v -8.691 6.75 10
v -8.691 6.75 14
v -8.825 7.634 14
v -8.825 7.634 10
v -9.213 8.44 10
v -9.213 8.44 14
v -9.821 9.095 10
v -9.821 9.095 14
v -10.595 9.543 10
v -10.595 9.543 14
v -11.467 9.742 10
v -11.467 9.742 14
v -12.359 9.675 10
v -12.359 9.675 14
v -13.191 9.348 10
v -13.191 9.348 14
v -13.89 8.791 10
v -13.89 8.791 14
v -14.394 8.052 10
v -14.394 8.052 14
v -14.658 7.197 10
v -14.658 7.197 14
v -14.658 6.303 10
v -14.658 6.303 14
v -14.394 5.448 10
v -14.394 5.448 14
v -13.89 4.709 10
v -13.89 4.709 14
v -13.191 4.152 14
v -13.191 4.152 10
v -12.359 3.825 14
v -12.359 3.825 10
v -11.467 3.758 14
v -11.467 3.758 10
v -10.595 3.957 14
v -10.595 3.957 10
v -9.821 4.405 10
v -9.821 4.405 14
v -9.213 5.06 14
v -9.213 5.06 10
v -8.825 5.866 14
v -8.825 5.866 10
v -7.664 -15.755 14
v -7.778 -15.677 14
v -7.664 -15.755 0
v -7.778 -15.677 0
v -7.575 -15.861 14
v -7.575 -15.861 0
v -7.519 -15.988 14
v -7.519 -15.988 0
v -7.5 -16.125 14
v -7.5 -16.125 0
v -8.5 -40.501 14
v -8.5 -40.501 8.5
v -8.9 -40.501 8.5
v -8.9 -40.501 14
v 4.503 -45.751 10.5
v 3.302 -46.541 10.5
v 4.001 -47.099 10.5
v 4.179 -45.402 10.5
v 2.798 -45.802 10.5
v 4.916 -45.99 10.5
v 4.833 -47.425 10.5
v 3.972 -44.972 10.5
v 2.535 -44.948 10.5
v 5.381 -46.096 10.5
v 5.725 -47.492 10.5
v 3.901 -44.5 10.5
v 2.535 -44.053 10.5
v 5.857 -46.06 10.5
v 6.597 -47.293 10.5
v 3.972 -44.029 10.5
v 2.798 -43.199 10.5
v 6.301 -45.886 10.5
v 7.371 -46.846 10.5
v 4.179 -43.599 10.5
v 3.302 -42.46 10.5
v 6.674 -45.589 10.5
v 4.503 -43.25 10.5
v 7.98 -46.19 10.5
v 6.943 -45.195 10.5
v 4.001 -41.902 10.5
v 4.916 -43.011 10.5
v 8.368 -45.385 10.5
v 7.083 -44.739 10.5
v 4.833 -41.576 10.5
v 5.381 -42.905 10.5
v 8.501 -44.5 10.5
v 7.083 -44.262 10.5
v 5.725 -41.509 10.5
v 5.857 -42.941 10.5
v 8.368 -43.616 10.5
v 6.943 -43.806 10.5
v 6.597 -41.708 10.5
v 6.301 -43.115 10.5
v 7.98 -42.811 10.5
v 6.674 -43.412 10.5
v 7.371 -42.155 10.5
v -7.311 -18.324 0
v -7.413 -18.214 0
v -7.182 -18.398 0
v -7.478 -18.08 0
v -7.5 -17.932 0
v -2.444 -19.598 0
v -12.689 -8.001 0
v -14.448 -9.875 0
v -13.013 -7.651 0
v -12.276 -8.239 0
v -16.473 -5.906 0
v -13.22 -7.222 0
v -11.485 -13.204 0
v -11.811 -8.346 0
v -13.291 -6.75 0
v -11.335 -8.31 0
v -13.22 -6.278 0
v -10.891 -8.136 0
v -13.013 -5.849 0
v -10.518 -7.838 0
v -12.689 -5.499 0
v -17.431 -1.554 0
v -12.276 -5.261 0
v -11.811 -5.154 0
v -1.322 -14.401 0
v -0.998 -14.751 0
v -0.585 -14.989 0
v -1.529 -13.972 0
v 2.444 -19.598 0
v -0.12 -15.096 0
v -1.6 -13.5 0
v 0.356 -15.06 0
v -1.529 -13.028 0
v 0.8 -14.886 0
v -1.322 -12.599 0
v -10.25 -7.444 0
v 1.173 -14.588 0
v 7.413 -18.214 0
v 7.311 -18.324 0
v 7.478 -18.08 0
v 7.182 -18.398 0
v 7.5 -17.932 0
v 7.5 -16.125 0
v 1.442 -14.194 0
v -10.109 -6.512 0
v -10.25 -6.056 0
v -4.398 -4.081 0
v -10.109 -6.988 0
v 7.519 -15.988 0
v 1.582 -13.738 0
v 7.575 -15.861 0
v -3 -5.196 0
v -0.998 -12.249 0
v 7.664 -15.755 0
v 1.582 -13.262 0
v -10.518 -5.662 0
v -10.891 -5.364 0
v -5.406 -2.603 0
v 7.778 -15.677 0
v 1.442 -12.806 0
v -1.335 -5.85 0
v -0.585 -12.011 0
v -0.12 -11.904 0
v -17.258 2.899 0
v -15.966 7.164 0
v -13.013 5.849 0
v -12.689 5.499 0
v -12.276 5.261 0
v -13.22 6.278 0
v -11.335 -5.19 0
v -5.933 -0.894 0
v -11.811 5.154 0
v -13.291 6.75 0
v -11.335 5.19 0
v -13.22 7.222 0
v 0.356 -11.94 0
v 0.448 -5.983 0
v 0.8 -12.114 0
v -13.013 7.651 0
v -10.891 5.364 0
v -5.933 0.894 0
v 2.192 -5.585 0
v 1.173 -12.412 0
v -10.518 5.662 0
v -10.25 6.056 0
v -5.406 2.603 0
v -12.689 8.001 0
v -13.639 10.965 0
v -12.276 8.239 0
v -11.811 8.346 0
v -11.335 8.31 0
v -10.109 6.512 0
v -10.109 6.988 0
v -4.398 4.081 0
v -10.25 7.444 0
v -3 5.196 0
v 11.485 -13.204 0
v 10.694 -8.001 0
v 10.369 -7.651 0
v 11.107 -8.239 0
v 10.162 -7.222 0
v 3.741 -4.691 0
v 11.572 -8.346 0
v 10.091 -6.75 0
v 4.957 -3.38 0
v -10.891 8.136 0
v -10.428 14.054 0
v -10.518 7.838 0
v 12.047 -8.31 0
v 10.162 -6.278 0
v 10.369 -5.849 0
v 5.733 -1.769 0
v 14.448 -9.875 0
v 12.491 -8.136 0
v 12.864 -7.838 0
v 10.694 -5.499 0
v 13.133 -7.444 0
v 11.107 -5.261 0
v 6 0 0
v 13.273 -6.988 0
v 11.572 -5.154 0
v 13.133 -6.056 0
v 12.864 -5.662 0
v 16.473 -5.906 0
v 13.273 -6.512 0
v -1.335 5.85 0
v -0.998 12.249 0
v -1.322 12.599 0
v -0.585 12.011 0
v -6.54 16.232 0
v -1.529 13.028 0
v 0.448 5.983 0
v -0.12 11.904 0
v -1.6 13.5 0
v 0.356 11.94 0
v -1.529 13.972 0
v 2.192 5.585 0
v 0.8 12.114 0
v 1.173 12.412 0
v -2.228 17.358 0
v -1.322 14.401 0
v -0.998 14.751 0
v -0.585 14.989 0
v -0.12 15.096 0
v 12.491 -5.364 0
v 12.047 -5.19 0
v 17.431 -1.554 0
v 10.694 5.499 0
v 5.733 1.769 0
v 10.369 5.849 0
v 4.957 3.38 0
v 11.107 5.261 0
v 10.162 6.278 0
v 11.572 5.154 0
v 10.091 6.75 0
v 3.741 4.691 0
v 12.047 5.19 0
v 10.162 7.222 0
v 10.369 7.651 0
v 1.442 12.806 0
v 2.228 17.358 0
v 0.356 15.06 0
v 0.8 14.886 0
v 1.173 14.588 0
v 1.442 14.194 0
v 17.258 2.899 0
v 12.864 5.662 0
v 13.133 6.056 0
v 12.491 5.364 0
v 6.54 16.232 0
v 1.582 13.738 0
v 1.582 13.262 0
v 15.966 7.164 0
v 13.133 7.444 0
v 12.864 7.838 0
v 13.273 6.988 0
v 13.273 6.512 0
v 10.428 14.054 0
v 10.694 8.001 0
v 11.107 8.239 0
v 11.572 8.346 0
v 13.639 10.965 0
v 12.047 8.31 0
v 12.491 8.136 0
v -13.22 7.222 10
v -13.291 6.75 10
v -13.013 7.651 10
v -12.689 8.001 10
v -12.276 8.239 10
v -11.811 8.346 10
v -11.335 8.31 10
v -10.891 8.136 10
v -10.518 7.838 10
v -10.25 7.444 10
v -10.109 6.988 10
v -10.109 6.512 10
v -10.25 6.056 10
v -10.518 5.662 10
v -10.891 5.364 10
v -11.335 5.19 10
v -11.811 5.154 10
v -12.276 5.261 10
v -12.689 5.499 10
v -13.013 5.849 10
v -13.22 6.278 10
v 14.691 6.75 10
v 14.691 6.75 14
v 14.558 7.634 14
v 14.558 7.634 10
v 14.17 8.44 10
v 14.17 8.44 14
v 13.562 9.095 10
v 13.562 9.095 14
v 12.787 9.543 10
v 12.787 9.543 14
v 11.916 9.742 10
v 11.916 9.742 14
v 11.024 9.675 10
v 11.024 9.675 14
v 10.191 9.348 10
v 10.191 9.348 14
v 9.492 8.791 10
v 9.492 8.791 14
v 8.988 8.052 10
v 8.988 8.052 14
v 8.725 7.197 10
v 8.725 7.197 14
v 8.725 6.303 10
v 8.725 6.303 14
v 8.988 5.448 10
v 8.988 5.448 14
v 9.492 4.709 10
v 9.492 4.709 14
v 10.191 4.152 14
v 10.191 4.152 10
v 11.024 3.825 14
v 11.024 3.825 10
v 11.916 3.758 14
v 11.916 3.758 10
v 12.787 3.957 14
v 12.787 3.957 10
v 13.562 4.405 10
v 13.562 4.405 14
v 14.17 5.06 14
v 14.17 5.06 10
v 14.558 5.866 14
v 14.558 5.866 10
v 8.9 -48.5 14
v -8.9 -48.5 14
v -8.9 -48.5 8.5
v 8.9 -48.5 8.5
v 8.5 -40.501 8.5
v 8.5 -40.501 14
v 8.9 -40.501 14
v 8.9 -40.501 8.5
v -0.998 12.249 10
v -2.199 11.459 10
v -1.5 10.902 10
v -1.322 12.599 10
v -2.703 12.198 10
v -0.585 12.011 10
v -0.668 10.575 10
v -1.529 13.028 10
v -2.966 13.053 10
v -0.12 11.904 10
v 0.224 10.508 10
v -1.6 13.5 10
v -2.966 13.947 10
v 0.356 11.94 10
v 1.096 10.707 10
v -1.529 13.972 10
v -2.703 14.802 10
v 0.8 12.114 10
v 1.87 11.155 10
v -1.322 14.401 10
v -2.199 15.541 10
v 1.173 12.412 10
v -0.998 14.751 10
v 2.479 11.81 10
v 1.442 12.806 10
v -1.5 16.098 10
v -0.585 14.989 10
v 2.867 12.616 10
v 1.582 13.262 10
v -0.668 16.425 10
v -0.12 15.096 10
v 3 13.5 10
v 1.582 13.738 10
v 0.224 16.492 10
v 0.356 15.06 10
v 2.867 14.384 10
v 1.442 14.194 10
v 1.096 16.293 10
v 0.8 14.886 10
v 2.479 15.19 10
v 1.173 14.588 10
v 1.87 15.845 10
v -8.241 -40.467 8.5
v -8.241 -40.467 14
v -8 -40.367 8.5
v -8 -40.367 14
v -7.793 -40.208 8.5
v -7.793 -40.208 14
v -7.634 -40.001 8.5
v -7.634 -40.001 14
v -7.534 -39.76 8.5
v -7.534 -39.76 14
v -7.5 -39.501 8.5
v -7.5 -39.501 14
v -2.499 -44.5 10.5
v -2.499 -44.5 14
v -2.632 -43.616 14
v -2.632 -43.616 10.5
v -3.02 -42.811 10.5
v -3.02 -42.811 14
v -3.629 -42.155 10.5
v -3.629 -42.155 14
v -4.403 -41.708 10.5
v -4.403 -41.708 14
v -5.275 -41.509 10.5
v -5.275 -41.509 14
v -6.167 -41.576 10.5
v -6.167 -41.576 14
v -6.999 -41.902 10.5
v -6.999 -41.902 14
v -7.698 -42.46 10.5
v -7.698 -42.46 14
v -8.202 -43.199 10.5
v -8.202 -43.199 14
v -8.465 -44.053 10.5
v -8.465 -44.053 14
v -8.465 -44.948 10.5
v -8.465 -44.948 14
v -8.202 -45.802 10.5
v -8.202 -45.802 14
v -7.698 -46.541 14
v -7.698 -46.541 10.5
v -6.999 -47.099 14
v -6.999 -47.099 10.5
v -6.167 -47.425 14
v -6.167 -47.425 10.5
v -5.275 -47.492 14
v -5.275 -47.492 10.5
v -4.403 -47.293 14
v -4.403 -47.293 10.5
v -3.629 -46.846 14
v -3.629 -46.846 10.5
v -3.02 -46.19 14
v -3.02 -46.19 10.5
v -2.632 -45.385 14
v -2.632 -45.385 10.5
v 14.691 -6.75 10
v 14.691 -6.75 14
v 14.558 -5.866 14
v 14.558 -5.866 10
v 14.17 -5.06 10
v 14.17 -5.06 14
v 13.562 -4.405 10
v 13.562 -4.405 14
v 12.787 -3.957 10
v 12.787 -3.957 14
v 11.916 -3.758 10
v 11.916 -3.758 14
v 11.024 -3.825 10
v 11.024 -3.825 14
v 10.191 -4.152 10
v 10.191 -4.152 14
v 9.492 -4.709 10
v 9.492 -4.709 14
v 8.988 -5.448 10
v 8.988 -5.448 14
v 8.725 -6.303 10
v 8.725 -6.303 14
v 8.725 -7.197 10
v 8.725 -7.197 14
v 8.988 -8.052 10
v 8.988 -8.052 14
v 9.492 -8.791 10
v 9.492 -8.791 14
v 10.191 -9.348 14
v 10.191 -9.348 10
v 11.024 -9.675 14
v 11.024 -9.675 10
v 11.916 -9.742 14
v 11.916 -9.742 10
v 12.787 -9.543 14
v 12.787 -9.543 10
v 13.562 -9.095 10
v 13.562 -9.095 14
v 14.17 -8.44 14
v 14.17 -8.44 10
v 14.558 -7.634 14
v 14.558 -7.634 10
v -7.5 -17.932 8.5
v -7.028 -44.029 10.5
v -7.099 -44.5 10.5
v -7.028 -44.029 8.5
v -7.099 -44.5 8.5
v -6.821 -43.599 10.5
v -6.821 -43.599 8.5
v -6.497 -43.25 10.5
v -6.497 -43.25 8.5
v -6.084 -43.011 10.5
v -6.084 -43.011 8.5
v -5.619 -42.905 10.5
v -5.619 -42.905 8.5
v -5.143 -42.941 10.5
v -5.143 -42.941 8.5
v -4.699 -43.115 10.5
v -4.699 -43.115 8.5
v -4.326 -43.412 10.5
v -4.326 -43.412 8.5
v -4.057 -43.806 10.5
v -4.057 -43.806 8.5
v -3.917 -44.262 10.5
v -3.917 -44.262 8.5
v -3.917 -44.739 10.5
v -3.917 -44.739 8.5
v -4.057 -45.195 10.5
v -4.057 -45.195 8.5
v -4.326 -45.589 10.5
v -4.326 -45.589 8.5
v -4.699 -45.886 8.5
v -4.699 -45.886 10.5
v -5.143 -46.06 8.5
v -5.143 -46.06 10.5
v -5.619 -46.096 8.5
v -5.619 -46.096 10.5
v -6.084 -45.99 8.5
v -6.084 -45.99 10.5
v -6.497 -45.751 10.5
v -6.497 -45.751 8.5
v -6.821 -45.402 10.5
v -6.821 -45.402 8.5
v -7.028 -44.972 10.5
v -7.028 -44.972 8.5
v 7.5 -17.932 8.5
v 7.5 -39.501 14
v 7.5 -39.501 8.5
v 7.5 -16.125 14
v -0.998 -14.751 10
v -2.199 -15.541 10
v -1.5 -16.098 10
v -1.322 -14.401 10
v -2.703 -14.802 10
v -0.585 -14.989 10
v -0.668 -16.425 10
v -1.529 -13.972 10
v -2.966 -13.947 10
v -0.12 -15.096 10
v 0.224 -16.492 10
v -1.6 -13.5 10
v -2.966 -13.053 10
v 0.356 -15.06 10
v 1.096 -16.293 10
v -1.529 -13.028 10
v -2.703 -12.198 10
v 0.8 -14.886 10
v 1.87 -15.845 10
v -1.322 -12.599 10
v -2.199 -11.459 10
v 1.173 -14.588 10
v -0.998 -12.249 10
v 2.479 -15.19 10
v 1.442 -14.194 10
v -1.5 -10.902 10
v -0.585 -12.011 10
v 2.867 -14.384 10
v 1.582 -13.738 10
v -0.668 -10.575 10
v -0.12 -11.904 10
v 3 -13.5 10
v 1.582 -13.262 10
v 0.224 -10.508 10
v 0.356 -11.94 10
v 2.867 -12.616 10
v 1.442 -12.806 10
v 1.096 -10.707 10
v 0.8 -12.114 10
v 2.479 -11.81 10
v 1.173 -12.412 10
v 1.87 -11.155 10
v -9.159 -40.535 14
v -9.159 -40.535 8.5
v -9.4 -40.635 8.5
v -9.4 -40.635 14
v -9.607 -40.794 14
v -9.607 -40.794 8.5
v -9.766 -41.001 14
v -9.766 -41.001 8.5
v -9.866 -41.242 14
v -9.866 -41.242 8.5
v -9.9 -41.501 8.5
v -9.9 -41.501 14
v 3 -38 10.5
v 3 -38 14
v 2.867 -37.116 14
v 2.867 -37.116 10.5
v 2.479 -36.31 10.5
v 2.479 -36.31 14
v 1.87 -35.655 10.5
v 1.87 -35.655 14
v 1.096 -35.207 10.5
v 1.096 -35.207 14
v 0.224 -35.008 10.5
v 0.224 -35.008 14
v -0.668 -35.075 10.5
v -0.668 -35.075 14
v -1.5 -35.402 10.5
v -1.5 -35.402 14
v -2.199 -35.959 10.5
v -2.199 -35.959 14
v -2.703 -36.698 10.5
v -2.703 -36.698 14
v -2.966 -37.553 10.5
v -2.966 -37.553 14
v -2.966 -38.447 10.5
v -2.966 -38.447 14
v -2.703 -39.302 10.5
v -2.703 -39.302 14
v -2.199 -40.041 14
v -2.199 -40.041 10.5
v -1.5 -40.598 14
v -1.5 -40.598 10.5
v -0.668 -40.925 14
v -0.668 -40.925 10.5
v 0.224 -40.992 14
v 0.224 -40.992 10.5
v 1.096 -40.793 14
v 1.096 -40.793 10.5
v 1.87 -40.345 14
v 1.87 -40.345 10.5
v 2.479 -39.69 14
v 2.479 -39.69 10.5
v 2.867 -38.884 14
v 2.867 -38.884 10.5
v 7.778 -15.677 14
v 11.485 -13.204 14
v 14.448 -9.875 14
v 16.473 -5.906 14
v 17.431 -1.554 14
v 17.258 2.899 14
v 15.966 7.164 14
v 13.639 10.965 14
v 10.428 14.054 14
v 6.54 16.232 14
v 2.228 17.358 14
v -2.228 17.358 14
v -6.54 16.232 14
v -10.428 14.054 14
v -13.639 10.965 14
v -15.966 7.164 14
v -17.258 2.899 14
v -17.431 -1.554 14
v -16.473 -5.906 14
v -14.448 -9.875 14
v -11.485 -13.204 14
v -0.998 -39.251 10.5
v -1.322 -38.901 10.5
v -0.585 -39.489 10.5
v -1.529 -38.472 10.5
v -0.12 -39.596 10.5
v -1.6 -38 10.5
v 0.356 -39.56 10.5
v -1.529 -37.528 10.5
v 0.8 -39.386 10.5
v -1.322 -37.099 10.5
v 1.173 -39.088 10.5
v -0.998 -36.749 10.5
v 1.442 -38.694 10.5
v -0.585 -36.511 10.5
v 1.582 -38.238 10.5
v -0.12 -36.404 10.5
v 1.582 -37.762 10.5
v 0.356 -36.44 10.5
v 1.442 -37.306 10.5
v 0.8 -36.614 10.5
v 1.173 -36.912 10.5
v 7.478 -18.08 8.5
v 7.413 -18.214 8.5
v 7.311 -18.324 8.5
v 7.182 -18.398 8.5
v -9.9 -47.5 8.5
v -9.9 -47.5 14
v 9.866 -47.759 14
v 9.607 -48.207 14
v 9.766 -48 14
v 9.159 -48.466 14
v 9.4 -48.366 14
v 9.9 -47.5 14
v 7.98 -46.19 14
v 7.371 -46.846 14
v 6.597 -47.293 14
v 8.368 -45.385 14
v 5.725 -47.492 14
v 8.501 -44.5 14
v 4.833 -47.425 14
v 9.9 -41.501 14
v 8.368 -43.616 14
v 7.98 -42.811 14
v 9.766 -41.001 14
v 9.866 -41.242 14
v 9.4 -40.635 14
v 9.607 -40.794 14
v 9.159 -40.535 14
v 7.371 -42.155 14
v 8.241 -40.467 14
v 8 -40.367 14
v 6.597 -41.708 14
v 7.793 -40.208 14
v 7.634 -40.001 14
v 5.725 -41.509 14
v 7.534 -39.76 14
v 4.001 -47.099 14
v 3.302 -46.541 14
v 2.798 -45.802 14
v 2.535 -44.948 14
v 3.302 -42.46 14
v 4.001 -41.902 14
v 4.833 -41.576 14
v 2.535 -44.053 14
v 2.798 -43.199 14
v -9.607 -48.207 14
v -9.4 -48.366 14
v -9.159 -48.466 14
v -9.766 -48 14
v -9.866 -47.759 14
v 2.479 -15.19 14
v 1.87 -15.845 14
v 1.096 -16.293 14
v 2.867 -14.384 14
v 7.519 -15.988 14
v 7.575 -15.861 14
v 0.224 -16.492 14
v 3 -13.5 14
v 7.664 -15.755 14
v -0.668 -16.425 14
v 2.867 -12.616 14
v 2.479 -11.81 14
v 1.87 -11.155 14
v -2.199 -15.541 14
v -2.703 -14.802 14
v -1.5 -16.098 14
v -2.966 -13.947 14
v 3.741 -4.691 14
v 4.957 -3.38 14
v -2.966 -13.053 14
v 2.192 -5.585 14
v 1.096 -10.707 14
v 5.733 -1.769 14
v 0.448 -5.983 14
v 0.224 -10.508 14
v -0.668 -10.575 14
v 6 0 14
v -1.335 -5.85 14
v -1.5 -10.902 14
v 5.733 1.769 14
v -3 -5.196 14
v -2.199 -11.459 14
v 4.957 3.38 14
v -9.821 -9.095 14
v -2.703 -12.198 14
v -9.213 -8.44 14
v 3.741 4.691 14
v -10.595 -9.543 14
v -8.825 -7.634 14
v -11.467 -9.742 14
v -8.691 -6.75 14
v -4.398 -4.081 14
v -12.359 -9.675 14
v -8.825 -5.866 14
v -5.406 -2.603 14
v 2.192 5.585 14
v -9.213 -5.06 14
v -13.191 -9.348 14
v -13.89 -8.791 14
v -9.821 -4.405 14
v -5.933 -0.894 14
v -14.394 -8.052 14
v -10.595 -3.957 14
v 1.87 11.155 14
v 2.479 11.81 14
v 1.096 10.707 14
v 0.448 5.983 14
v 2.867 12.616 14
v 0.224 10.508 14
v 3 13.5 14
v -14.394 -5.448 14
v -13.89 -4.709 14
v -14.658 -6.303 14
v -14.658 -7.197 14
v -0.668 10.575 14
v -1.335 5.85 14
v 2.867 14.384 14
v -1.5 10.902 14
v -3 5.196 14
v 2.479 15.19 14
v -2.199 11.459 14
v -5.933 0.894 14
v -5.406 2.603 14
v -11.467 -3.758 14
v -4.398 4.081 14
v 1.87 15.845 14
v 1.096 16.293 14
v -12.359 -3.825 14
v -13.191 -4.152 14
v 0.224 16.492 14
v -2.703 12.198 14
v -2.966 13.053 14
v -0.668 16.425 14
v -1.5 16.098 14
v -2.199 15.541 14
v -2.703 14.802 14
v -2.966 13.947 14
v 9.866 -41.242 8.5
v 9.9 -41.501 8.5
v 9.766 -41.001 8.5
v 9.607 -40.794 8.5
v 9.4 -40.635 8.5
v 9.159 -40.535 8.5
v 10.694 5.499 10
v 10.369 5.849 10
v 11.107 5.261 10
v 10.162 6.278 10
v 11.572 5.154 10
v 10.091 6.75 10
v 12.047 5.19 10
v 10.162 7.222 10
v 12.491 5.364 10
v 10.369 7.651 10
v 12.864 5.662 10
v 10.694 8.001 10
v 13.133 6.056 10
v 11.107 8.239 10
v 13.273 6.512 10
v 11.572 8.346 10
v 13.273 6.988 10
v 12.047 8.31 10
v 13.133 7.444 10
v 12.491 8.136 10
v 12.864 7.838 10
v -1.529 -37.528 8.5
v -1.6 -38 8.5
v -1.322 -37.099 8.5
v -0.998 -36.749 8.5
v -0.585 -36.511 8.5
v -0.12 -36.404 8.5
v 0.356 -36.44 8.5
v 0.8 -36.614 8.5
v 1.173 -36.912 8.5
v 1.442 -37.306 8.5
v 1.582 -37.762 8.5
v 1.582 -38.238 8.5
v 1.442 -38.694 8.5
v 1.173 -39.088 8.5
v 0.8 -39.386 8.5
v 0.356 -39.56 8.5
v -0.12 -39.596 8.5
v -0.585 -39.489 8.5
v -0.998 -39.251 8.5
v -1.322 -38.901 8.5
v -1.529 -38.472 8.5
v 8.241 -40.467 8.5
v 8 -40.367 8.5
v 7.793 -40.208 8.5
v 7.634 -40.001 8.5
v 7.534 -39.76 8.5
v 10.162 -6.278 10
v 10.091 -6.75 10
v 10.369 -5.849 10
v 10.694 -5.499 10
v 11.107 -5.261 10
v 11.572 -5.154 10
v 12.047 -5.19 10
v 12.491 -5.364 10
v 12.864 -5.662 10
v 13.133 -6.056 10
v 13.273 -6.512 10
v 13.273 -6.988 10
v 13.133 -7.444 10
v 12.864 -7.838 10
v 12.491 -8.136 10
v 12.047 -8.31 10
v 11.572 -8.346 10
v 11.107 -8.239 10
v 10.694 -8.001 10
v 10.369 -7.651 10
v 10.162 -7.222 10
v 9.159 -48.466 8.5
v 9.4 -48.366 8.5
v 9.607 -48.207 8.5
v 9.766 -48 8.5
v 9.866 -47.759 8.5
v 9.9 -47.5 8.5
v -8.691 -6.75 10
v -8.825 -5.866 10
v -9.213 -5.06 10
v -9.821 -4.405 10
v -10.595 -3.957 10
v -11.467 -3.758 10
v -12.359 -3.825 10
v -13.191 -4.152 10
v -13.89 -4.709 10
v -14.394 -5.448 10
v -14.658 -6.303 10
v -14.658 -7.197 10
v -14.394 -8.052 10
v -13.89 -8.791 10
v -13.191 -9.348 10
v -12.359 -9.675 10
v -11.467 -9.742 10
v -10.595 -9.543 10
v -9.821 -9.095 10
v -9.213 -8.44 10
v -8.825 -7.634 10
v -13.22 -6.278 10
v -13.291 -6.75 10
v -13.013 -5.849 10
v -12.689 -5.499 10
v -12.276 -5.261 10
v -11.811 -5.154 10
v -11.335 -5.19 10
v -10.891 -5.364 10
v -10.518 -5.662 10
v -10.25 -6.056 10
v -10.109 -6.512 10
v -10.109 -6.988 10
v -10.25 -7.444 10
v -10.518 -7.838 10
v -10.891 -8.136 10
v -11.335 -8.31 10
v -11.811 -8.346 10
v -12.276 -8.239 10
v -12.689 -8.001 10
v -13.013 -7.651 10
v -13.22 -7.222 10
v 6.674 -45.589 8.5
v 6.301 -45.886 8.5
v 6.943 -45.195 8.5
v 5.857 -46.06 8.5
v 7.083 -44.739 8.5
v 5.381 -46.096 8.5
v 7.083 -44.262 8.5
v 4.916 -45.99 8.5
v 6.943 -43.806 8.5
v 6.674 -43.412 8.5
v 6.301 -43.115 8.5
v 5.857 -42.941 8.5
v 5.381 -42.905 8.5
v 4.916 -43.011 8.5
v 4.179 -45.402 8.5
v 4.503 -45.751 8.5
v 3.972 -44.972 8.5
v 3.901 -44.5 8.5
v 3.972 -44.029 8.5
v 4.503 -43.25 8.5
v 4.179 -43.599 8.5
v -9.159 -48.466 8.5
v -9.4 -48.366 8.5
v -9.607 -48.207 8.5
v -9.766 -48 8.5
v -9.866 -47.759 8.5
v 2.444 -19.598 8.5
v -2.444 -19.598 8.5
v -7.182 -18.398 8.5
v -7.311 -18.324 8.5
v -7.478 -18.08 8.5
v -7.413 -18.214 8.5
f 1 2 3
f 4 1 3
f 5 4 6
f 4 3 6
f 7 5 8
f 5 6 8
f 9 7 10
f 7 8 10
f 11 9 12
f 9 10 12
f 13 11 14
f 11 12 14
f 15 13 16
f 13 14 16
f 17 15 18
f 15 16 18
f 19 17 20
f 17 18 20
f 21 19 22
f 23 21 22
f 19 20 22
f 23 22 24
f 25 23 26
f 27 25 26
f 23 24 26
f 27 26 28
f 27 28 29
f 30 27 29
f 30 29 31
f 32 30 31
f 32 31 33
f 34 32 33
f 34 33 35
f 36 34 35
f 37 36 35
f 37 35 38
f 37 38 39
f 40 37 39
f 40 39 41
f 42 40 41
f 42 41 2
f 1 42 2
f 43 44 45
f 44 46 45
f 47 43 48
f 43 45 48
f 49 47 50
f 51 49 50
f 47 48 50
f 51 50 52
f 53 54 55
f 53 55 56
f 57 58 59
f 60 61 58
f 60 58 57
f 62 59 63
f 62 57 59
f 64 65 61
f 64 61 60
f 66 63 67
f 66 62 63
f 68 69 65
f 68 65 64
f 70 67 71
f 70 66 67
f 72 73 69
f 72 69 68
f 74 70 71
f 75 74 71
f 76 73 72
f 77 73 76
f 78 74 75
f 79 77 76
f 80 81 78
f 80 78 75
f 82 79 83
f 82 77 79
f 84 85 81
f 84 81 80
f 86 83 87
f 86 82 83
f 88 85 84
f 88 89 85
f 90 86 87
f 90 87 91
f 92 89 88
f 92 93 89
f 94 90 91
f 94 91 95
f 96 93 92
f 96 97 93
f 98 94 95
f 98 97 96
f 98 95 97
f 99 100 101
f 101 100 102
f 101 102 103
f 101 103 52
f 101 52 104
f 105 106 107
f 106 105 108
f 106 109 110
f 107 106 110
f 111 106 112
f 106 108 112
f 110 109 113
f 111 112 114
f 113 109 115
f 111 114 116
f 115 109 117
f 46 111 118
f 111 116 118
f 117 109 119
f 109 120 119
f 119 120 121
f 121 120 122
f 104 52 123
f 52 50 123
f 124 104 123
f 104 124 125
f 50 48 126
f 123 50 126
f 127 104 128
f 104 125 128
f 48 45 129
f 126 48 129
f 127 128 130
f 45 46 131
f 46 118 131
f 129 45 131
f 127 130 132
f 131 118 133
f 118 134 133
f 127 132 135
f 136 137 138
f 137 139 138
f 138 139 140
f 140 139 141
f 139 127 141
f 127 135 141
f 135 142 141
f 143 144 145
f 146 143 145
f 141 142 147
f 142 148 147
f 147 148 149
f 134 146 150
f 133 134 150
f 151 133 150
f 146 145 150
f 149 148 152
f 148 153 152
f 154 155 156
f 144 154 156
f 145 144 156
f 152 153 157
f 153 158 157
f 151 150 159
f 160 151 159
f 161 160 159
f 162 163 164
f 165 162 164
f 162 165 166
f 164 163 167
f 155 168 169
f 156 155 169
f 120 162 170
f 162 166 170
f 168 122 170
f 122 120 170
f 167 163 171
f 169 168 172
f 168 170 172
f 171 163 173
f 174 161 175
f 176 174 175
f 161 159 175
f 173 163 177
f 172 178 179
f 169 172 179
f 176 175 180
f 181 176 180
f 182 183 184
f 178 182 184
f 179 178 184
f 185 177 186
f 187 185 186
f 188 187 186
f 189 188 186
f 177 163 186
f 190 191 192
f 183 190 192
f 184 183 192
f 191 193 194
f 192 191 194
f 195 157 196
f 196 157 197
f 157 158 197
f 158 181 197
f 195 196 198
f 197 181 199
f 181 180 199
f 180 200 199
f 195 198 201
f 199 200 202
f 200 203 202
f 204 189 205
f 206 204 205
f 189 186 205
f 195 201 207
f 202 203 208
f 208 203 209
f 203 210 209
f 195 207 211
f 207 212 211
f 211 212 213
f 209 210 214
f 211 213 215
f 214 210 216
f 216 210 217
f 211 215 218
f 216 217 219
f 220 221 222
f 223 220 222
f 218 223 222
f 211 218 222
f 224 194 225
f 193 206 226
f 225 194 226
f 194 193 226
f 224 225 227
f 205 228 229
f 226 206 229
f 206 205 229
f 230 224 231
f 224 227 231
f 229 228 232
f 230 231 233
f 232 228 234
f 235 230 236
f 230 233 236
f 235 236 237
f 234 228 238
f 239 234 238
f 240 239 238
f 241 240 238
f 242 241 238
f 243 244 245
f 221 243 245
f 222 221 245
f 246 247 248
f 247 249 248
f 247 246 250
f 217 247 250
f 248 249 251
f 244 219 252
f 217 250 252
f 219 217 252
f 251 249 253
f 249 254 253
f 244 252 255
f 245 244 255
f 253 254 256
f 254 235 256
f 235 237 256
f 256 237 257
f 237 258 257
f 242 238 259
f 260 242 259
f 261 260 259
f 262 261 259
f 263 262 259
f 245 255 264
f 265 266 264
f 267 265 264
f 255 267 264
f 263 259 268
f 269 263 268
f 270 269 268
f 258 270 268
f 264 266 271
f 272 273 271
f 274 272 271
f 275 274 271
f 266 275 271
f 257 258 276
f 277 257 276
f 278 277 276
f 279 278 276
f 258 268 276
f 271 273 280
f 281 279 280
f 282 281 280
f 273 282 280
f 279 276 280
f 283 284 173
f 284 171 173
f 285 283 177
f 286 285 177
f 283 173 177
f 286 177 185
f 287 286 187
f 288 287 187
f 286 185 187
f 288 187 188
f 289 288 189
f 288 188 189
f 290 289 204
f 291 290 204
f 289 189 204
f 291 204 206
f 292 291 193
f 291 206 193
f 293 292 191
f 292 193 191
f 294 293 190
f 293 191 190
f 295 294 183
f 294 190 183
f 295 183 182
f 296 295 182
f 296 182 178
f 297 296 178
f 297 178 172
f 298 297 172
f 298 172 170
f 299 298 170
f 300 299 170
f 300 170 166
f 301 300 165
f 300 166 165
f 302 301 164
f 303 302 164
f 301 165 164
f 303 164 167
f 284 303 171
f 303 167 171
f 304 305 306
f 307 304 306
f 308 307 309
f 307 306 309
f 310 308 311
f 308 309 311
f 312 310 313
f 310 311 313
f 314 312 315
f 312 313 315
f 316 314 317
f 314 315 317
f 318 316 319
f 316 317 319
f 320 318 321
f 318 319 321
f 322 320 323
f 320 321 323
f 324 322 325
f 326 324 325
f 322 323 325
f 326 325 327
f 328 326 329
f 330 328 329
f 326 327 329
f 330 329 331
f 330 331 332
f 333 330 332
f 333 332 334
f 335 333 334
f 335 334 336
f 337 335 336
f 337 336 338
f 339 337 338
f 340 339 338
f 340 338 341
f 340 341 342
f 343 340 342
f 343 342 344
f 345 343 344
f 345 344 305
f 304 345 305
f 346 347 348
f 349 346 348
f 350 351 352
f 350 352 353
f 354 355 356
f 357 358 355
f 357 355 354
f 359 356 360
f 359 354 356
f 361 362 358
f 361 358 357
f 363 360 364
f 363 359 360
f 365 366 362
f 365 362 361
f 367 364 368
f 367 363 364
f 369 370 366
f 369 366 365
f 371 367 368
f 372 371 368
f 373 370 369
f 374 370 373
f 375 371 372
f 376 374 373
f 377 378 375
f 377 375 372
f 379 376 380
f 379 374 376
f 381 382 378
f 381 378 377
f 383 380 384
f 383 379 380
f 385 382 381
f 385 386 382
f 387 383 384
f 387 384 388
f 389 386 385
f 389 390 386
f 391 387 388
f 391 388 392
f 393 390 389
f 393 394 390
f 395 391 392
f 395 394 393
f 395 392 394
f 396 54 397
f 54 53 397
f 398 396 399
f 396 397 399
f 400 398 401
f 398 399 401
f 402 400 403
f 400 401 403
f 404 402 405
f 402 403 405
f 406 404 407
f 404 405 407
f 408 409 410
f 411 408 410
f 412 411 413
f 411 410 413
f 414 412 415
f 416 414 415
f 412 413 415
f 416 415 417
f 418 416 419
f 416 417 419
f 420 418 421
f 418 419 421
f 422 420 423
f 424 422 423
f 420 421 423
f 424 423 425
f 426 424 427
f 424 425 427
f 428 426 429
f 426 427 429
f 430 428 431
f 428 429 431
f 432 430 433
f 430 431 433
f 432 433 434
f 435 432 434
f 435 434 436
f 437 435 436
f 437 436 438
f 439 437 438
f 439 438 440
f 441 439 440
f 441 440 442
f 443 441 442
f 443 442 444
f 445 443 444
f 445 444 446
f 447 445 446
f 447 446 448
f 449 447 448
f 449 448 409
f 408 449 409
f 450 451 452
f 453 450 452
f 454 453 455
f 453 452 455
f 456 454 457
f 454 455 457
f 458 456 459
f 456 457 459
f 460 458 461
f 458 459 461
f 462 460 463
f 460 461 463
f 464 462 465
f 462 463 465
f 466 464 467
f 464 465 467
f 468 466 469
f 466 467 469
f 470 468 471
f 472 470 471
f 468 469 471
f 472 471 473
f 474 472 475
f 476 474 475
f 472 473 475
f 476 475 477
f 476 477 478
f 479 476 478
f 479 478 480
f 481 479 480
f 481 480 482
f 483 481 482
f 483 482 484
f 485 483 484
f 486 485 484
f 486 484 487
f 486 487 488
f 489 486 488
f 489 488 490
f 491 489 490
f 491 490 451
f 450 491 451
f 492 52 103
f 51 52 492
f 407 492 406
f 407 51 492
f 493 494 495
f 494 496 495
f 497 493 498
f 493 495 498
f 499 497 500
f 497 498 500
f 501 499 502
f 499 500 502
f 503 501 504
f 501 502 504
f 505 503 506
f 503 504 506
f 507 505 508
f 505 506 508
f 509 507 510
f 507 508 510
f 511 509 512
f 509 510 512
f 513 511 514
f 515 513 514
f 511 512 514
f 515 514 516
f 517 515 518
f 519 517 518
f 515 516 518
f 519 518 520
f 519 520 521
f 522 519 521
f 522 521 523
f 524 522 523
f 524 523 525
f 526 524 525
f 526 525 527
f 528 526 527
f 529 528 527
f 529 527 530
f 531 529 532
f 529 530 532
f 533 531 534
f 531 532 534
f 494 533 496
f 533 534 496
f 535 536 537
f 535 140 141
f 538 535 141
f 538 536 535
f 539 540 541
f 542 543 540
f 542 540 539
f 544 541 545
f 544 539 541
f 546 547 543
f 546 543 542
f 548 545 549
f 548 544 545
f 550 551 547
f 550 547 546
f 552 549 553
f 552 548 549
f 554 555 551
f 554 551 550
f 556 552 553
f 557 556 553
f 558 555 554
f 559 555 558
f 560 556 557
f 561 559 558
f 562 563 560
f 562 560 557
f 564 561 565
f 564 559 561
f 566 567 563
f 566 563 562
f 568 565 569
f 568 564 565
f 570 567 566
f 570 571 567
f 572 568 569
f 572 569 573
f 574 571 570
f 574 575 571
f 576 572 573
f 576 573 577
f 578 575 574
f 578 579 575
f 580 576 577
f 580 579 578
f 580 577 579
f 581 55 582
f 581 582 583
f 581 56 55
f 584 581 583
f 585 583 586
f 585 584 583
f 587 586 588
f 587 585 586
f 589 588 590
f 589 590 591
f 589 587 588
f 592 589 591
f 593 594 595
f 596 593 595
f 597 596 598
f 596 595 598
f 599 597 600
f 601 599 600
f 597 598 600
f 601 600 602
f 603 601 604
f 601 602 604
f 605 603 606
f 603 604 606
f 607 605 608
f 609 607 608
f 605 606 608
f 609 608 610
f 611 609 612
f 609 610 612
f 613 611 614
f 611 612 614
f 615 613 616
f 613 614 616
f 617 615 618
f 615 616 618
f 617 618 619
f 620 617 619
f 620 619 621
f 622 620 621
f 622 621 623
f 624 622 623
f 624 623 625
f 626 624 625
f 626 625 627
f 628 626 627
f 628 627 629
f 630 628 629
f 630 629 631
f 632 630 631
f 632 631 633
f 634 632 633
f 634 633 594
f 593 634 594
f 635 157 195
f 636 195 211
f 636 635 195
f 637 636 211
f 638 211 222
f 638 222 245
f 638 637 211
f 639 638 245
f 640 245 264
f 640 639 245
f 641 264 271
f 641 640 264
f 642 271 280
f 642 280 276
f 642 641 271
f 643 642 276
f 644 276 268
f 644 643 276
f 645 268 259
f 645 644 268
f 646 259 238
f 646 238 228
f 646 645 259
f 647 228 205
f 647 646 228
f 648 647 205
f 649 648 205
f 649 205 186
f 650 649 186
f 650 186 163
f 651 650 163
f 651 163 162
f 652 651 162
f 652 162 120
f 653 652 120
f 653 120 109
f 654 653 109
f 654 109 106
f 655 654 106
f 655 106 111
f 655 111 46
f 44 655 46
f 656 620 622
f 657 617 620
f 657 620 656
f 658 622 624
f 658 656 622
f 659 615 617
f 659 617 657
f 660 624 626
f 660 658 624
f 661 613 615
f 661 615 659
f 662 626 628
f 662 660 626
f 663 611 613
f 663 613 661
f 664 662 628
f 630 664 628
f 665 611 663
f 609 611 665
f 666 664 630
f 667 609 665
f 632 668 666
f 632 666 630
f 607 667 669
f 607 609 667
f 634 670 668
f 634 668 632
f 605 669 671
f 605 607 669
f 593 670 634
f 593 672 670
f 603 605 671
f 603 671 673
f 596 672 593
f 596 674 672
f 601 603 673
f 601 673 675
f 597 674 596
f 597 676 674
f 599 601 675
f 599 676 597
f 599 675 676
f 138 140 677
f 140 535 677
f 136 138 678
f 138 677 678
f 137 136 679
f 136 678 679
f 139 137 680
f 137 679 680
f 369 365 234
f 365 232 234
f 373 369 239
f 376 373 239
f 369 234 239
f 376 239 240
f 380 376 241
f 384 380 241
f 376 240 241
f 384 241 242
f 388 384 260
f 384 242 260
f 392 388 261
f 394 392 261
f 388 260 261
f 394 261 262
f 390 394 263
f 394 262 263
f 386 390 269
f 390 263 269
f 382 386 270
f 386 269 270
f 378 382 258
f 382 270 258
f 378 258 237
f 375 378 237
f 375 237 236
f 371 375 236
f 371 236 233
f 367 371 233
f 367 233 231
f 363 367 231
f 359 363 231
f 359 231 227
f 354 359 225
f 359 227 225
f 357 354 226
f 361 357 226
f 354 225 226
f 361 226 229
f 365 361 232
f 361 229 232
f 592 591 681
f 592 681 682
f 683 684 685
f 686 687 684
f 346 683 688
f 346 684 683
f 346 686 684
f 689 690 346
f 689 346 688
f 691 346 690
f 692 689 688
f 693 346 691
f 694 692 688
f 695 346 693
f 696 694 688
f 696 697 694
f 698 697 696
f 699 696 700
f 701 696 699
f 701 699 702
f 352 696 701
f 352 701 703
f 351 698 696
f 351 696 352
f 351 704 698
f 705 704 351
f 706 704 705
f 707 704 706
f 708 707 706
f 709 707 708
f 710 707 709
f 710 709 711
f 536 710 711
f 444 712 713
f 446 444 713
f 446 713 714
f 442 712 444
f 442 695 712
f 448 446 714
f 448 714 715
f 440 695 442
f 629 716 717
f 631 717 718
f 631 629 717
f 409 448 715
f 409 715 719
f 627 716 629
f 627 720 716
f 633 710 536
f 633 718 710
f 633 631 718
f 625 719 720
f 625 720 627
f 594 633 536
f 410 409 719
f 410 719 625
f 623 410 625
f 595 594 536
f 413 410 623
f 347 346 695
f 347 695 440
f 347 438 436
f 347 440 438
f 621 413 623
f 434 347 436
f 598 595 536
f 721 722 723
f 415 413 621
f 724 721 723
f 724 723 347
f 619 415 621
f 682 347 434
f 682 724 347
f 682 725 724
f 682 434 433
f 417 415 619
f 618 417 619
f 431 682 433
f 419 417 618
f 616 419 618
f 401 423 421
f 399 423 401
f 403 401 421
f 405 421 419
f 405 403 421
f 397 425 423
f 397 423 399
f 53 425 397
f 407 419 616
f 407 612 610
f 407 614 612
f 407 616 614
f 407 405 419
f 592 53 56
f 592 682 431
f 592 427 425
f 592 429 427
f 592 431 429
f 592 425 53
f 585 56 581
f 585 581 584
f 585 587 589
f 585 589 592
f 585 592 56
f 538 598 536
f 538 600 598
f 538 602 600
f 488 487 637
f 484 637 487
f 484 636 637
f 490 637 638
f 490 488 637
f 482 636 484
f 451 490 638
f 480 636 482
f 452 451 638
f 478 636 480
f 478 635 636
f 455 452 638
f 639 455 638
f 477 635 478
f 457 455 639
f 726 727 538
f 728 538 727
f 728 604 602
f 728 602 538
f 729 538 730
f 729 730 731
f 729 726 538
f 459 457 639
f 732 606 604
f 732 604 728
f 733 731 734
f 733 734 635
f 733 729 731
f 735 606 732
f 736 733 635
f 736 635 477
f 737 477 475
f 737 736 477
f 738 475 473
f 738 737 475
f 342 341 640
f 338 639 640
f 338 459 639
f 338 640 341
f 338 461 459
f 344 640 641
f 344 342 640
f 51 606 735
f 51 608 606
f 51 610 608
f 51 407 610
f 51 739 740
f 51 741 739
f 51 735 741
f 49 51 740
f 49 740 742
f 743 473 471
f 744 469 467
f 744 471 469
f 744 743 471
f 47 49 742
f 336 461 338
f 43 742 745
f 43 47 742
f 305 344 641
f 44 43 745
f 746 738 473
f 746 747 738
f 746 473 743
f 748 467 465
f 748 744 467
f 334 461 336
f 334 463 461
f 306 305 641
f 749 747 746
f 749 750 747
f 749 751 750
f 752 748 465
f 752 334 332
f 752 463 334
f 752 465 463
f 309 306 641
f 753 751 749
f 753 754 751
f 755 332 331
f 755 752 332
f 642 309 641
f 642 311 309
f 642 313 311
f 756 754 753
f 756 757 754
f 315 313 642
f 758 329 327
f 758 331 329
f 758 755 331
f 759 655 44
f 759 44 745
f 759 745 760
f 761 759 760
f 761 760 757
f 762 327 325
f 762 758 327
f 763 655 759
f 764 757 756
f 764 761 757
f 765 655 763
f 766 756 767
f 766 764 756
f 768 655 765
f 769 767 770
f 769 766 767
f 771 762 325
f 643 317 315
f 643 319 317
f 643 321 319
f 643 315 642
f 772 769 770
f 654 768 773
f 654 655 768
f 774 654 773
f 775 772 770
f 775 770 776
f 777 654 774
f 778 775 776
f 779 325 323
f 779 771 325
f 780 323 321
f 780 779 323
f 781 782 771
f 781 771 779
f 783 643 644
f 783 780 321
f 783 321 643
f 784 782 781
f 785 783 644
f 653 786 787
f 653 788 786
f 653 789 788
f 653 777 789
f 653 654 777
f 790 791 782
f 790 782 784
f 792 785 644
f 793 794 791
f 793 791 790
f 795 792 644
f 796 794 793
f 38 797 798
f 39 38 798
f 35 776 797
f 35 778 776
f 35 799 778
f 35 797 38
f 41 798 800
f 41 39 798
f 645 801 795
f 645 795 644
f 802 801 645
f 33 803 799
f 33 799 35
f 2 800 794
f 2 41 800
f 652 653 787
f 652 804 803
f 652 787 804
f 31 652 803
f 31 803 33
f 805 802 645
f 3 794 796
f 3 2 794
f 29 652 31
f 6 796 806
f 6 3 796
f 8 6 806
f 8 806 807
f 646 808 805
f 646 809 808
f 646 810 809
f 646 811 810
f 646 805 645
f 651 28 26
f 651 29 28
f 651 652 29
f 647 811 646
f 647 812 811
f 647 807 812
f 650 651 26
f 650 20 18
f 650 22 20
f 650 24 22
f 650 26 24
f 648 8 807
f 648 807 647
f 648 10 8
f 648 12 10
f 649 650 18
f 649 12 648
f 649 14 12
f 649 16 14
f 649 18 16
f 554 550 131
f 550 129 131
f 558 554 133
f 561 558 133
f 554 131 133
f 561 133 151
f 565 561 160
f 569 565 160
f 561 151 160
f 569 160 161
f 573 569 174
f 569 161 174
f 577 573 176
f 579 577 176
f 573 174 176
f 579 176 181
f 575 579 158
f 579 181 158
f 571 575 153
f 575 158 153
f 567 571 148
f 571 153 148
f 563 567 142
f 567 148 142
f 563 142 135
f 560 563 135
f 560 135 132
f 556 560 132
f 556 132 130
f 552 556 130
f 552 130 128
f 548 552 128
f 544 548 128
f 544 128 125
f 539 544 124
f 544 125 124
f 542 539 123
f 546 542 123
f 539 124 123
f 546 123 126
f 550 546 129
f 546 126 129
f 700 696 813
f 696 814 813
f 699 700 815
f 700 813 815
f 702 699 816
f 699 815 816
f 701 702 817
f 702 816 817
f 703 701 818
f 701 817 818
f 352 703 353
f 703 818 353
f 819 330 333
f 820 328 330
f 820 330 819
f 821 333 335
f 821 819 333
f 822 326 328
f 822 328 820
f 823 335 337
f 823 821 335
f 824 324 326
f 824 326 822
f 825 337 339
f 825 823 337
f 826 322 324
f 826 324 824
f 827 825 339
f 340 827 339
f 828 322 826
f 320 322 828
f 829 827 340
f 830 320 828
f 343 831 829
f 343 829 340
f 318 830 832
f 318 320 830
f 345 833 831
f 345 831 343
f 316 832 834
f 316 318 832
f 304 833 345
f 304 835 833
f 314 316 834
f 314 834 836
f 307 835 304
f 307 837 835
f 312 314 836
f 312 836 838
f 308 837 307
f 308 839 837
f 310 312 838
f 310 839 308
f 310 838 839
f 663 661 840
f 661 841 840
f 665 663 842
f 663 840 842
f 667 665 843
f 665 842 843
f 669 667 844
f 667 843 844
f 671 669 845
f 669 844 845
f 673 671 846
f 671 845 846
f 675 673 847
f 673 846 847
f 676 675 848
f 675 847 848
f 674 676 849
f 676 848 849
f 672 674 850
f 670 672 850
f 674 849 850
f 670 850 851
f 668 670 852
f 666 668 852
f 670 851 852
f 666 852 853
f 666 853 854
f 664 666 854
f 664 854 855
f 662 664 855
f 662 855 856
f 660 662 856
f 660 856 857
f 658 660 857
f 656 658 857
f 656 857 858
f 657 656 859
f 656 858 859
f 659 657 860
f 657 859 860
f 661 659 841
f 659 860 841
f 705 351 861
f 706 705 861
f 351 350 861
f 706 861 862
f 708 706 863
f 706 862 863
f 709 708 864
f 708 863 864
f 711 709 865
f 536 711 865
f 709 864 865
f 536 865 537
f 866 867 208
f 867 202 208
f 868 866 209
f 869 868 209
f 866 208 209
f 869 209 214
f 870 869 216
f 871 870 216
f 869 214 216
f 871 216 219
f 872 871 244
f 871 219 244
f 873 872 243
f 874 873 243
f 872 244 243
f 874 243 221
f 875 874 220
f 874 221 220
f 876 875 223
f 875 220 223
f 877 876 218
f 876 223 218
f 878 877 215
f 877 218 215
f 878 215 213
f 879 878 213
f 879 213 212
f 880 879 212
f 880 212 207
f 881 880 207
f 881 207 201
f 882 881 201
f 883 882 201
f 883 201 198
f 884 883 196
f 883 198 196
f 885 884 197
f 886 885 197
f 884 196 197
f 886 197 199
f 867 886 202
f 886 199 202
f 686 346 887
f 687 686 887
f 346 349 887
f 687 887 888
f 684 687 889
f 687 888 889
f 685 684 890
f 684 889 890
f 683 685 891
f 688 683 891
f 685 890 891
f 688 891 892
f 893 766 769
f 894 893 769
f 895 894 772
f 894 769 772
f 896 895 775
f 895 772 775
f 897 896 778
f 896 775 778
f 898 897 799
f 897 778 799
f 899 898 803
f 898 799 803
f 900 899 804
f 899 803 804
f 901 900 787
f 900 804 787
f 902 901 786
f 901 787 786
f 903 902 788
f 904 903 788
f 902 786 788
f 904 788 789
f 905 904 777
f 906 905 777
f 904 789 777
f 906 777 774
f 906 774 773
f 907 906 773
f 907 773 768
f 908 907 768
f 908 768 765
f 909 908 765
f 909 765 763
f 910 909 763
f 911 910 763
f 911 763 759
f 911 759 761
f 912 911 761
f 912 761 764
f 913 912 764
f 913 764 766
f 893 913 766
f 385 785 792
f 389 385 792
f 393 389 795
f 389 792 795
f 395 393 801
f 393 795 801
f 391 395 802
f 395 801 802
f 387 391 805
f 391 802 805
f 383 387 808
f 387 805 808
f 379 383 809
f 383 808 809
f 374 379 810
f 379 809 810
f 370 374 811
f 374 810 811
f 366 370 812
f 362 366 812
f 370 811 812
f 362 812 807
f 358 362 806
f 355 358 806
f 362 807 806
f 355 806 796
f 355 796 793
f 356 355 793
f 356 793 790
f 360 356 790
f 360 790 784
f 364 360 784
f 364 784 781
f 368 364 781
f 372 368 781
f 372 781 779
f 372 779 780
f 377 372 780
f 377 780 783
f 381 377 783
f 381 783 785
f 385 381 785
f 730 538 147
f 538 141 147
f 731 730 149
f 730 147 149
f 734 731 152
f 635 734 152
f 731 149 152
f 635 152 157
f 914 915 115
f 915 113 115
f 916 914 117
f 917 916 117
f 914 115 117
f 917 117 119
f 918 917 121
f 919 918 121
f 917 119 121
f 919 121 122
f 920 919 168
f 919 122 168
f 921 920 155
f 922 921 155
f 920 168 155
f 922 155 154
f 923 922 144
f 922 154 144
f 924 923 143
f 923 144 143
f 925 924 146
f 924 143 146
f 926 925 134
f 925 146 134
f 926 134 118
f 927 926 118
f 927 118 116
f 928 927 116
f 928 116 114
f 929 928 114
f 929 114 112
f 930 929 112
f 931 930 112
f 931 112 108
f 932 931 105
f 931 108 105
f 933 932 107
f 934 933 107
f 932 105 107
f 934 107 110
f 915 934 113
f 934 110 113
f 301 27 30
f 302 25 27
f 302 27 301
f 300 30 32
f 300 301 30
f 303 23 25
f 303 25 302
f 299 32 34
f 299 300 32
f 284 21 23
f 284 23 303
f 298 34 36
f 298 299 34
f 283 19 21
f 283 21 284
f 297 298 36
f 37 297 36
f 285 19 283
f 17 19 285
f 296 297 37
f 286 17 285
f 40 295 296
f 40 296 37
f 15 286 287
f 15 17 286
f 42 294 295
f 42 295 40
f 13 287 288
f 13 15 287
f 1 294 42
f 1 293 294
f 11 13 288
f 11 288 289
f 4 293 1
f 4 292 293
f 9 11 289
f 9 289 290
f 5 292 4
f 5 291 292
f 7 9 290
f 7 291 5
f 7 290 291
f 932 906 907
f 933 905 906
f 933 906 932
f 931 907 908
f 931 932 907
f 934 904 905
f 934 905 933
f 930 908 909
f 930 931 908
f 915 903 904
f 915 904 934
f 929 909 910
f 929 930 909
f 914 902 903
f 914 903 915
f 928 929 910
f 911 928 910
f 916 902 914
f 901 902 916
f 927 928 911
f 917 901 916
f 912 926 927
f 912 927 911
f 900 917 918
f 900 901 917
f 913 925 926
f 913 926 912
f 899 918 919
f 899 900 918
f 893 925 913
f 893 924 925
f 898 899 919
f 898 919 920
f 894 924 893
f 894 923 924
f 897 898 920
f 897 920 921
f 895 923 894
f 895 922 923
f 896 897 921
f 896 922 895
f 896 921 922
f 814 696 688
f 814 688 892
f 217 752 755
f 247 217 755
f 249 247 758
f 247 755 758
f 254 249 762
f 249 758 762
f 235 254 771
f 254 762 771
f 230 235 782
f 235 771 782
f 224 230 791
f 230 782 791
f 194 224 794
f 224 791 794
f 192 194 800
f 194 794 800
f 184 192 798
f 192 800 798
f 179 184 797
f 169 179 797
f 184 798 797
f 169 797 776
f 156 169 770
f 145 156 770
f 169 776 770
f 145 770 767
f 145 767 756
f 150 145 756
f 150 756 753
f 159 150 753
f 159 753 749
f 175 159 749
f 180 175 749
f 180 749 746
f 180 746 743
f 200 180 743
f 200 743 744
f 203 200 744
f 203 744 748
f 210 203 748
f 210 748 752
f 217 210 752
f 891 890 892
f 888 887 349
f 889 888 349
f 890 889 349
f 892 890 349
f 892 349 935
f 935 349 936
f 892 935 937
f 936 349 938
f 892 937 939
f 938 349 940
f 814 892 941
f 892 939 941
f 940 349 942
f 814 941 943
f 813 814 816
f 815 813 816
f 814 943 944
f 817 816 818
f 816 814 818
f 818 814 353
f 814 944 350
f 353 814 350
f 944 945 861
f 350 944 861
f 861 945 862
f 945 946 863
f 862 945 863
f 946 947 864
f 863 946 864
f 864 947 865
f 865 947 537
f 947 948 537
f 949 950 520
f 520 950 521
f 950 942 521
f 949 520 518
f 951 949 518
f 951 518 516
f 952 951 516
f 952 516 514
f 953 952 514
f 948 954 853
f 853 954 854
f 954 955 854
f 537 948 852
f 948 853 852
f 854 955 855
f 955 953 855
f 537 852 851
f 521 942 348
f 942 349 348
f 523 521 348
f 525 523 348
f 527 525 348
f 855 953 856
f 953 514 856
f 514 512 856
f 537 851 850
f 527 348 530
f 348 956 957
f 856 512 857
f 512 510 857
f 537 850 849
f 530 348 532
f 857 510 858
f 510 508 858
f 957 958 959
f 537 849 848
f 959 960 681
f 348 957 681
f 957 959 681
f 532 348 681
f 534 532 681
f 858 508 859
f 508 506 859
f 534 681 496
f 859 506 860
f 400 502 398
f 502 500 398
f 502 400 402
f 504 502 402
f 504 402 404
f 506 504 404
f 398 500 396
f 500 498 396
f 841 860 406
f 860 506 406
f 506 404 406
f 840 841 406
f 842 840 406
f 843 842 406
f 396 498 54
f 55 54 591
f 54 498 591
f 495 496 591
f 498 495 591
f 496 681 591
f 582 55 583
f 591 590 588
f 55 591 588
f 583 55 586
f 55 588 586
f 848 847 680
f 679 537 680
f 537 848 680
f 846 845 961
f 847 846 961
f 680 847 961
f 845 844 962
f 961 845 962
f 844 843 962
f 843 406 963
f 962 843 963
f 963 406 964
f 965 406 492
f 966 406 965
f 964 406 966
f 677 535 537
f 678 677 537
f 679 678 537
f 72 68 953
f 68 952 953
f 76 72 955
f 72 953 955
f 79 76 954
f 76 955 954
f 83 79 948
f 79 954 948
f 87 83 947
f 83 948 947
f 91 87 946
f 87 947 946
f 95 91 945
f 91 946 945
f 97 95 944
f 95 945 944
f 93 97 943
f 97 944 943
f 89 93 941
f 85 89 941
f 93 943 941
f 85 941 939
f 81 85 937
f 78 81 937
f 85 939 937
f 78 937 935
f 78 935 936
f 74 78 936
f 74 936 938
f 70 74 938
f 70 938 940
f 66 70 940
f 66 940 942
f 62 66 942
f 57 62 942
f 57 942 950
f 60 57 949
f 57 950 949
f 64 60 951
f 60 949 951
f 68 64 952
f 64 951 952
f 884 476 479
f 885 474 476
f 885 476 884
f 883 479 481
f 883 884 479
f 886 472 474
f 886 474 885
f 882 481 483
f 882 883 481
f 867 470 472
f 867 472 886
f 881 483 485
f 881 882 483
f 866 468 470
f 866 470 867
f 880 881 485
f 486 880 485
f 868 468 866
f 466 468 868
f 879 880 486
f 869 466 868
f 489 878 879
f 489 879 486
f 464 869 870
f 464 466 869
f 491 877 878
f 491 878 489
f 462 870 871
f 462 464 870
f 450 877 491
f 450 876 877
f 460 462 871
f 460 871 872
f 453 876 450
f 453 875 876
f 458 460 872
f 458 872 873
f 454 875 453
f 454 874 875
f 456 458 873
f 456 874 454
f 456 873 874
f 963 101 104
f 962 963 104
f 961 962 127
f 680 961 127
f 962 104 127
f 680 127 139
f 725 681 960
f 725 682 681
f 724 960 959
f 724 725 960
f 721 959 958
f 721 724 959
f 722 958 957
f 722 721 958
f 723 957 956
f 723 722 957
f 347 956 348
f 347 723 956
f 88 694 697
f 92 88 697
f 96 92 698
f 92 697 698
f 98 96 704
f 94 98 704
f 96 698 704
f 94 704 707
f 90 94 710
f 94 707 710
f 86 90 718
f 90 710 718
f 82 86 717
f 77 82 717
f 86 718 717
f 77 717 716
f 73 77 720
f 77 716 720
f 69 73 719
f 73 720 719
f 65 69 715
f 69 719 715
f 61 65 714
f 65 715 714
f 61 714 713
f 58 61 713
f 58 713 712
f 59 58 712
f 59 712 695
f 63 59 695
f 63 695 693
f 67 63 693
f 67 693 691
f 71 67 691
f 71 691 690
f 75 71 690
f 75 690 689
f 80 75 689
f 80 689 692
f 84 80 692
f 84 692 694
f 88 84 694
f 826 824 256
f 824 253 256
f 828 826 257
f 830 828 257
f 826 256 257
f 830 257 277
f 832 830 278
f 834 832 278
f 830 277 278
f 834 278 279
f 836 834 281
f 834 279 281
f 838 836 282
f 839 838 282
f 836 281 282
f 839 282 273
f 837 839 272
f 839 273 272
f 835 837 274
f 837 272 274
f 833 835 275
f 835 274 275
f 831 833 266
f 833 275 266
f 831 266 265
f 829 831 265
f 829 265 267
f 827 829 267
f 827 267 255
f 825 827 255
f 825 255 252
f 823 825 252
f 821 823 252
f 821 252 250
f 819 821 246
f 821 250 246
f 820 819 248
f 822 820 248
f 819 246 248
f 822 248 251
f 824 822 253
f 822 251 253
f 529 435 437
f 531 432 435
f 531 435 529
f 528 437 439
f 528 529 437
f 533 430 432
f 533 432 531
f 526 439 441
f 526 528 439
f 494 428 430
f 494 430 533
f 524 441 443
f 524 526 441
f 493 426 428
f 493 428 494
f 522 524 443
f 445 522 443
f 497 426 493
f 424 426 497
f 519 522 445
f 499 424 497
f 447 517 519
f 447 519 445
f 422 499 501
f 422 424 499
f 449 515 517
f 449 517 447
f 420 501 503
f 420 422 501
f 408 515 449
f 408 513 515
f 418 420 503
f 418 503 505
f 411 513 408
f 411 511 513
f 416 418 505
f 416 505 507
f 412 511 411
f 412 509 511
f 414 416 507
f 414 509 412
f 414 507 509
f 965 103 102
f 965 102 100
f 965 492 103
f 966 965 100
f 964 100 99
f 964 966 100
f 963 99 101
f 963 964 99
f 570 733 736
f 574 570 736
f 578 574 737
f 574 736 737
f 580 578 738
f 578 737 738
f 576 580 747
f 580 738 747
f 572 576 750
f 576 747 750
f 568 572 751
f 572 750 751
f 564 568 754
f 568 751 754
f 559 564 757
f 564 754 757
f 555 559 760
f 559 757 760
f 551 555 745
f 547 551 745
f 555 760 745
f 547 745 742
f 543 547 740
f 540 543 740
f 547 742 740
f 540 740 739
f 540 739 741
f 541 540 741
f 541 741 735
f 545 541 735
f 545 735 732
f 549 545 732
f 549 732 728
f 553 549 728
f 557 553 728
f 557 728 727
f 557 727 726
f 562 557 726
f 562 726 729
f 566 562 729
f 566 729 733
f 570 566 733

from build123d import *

# Parameters (mm, degrees)
EXTRUDE_1_DEPTH              = 14
CUT_EXTRUDE_1_DEPTH          = 8.5
SKETCH_3_W                   = 5.5
SKETCH_3_H                   = 7.999
EXTRUDE_2_DEPTH              = 2.4
SKETCH_4_W                   = 5.5
SKETCH_4_H                   = 7.999
EXTRUDE_3_DEPTH              = 2.4
HOLE_WIZARD_12_0_12_1_D      = 12
HOLE_WIZARD_M3_1_D           = 3.2
HOLE_WIZARD_M3_1_CBORE_D     = 6
HOLE_WIZARD_M3_1_CBORE_DEPTH = 4
HOLE_WIZARD_M3_2_D           = 3.2
HOLE_WIZARD_M3_2_DEPTH       = 14
HOLE_WIZARD_M3_2_CBORE_D     = 6
HOLE_WIZARD_M3_2_CBORE_DEPTH = 3.5
FILLET_1_R                   = 0.5
FILLET_2_R                   = 1


with BuildPart() as part:
    # 草图1 → 凸台-拉伸1 (new body)
    with BuildSketch(Plane.XY.offset(14)):
        with BuildLine():
            Line((-7.5, -15.811388301), (-7.5, -48.5))
            Line((-7.5, -48.5), (7.5, -48.5))
            Line((7.5, -48.5), (7.5, -15.811388301))
            ThreePointArc((7.5, -15.811388301), (0, 17.5), (-7.5, -15.811388301))
        make_face()
    extrude(amount=-EXTRUDE_1_DEPTH)

    # 草图2 → 切除-拉伸1 (cut)
    with BuildSketch(Plane(origin=(0, 0, 0), x_dir=(-1, 0, 0), z_dir=(0, 0, -1))):
        with BuildLine():
            Line((7.5, -48.5), (7.5, -18.270536391))
            ThreePointArc((7.5, -18.270536391), (0, -19.75), (-7.5, -18.270536391))
            Line((-7.5, -18.270536391), (-7.5, -48.5))
            Line((-7.5, -48.5), (7.5, -48.5))
        make_face()
    extrude(amount=-CUT_EXTRUDE_1_DEPTH, mode=Mode.SUBTRACT)

    # 草图3 → 凸台-拉伸2 (add)
    with BuildSketch(Plane.ZY.offset(7.5)):
        with Locations((11.25, -44.5005)):
            Rectangle(SKETCH_3_W, SKETCH_3_H)
    extrude(amount=EXTRUDE_2_DEPTH)

    # 草图4 → 凸台-拉伸3 (add)
    with BuildSketch(Plane(origin=(7.5, 0, 0), x_dir=(0, 0, -1), z_dir=(1, 0, 0))):
        with Locations((-11.25, -44.5005)):
            Rectangle(SKETCH_4_W, SKETCH_4_H)
    extrude(amount=EXTRUDE_3_DEPTH)

    # Ø12.0 (12) 直径孔1 (through all)
    with Locations(Plane(origin=(0, 0, 0), x_dir=(-1, 0, 0), z_dir=(0, 0, -1))):
        with Locations((0, 0)):
            Hole(HOLE_WIZARD_12_0_12_1_D / 2)

    # M3 六角头机械螺钉的柱形沉头孔1 (through all)
    with Locations(Plane.XY.offset(14)):
        with Locations((0, 13.5), (11.691342951, 6.75), (11.691342951, -6.75), (0, -13.5), (-11.691342951, -6.75), (-11.691342951, 6.75)):
            CounterBoreHole(HOLE_WIZARD_M3_1_D / 2, HOLE_WIZARD_M3_1_CBORE_D / 2, HOLE_WIZARD_M3_1_CBORE_DEPTH)

    # M3 六角头机械螺钉的柱形沉头孔2
    with Locations(Plane.XY.offset(14)):
        with Locations((0, -38), (5.501, -44.5005), (-5.499, -44.5005)):
            CounterBoreHole(HOLE_WIZARD_M3_2_D / 2, HOLE_WIZARD_M3_2_CBORE_D / 2, HOLE_WIZARD_M3_2_CBORE_DEPTH, depth=HOLE_WIZARD_M3_2_DEPTH)

    # 圆角1
    fillet_1_edges = [part.edges().sort_by_distance(p)[0] for p in [
        (7.5, -18.270536391, 4.25),
        (-7.5, -18.270536391, 4.25),
        (7.5, -15.811388301, 7),
        (-7.5, -15.811388301, 7),
    ]]
    fillet(fillet_1_edges, radius=FILLET_1_R)

    # 圆角2
    fillet_2_edges = [part.edges().sort_by_distance(p)[0] for p in [
        (-7.5, -40.501, 11.25),
        (-9.9, -40.501, 11.25),
        (-9.9, -48.5, 11.25),
        (7.5, -40.501, 11.25),
        (9.9, -40.501, 11.25),
        (9.9, -48.5, 11.25),
    ]]
    fillet(fillet_2_edges, radius=FILLET_2_R)


solid = part.part
